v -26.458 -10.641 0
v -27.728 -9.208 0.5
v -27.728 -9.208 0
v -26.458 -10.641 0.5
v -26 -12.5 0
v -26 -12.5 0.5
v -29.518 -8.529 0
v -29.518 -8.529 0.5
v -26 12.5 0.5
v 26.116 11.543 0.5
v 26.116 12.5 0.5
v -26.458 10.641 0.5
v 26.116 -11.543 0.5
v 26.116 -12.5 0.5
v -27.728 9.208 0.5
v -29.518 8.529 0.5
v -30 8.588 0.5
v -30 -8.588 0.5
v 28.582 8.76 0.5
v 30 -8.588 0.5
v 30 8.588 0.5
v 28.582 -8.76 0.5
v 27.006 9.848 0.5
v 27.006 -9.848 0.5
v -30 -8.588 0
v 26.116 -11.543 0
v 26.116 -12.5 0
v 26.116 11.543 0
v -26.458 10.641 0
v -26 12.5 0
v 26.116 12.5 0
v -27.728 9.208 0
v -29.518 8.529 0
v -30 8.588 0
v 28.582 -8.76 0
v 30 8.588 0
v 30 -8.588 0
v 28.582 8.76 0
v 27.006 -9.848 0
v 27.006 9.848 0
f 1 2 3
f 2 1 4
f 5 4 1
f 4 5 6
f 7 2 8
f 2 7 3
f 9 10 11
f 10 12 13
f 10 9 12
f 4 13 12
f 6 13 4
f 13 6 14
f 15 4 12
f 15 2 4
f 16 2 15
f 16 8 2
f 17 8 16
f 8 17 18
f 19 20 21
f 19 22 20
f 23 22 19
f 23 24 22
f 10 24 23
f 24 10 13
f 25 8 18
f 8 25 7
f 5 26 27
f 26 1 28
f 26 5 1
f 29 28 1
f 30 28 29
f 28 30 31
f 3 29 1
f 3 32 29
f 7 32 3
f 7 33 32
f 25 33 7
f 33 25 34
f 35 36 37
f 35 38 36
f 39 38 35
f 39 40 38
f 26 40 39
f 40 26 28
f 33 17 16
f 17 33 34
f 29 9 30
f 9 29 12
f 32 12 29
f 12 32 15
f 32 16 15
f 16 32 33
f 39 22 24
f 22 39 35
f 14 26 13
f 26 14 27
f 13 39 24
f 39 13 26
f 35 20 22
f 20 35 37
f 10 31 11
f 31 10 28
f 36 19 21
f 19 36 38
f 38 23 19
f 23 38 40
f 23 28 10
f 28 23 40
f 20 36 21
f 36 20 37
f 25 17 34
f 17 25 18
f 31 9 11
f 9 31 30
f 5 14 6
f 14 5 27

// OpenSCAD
module coral_insulator_plate()
{
    width = 60;
    length = 25;
    thickness = 0.5;
    corner_diameter = 8;
    
    difference()
    {
        union()
        {
            translate([-width/2, -length/2, 0])
            cube([60, 25, 0.5]);
        }
        union()
        {
            for( x_translation = [-width/2, width/2] )
            {
                for( y_translation = [-length/2, length/2] )
                {
                    translate([x_translation, y_translation, 0])
                    cylinder(h=thickness, d=corner_diameter);
                }
            }
        }
    }
}

coral_insulator_plate();
